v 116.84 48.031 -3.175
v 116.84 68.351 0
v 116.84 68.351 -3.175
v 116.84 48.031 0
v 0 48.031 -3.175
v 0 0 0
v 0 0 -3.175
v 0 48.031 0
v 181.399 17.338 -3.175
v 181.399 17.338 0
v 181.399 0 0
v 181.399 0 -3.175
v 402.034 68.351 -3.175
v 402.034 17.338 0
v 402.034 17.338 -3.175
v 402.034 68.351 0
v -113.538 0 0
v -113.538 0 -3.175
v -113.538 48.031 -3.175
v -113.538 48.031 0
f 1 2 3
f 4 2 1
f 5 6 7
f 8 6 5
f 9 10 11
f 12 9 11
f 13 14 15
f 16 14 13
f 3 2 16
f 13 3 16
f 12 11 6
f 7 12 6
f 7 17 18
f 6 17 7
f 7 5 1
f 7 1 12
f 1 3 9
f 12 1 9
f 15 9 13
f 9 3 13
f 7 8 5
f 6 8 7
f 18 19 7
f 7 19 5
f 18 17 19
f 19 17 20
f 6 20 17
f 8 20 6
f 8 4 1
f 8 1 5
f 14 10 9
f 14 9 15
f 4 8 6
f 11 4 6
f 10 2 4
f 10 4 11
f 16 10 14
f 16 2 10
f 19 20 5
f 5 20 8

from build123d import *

# Parameters (mm, degrees)
BOSS_EXTRUDE1_DEPTH = 3.175
SKETCH2_W           = 113.538
SKETCH2_H           = 48.0314
BOSS_EXTRUDE2_DEPTH = 3.175
BOSS_EXTRUDE3_DEPTH = 3.175
SKETCH4_W           = 104.4956
SKETCH4_H           = 51.01336
BOSS_EXTRUDE4_DEPTH = 3.175


with BuildPart() as part:
    # Sketch1 → Boss-Extrude1 (new body)
    with BuildSketch(Plane.XY):
        Polygon((0, 48.0314), (0, 0), (172.11294, 0), (172.11294, 68.3514), (116.84, 68.3514), (116.84, 48.0314), align=None)
    extrude(amount=-BOSS_EXTRUDE1_DEPTH)

    # Sketch3 → Boss-Extrude3 (add)
    with BuildSketch(Plane.XY):
        Polygon((172.11294, 68.3514), (297.53814, 68.3514), (297.53814, 17.33804), (181.39918, 17.33804), (181.39918, 0), (172.11294, 0), align=None)
    extrude(amount=-BOSS_EXTRUDE3_DEPTH)

    # Sketch4 → Boss-Extrude4 (add)
    with BuildSketch(Plane.XY):
        with Locations((349.78594, 42.84472)):
            Rectangle(SKETCH4_W, SKETCH4_H)
    extrude(amount=-BOSS_EXTRUDE4_DEPTH)


with BuildPart() as body_2:
    # Sketch2 → Boss-Extrude2 (new body)
    with BuildSketch(Plane.XY):
        with Locations((-56.769, 24.0157)):
            Rectangle(SKETCH2_W, SKETCH2_H)
    extrude(amount=-BOSS_EXTRUDE2_DEPTH)


solid = Compound([part.part, body_2.part])
